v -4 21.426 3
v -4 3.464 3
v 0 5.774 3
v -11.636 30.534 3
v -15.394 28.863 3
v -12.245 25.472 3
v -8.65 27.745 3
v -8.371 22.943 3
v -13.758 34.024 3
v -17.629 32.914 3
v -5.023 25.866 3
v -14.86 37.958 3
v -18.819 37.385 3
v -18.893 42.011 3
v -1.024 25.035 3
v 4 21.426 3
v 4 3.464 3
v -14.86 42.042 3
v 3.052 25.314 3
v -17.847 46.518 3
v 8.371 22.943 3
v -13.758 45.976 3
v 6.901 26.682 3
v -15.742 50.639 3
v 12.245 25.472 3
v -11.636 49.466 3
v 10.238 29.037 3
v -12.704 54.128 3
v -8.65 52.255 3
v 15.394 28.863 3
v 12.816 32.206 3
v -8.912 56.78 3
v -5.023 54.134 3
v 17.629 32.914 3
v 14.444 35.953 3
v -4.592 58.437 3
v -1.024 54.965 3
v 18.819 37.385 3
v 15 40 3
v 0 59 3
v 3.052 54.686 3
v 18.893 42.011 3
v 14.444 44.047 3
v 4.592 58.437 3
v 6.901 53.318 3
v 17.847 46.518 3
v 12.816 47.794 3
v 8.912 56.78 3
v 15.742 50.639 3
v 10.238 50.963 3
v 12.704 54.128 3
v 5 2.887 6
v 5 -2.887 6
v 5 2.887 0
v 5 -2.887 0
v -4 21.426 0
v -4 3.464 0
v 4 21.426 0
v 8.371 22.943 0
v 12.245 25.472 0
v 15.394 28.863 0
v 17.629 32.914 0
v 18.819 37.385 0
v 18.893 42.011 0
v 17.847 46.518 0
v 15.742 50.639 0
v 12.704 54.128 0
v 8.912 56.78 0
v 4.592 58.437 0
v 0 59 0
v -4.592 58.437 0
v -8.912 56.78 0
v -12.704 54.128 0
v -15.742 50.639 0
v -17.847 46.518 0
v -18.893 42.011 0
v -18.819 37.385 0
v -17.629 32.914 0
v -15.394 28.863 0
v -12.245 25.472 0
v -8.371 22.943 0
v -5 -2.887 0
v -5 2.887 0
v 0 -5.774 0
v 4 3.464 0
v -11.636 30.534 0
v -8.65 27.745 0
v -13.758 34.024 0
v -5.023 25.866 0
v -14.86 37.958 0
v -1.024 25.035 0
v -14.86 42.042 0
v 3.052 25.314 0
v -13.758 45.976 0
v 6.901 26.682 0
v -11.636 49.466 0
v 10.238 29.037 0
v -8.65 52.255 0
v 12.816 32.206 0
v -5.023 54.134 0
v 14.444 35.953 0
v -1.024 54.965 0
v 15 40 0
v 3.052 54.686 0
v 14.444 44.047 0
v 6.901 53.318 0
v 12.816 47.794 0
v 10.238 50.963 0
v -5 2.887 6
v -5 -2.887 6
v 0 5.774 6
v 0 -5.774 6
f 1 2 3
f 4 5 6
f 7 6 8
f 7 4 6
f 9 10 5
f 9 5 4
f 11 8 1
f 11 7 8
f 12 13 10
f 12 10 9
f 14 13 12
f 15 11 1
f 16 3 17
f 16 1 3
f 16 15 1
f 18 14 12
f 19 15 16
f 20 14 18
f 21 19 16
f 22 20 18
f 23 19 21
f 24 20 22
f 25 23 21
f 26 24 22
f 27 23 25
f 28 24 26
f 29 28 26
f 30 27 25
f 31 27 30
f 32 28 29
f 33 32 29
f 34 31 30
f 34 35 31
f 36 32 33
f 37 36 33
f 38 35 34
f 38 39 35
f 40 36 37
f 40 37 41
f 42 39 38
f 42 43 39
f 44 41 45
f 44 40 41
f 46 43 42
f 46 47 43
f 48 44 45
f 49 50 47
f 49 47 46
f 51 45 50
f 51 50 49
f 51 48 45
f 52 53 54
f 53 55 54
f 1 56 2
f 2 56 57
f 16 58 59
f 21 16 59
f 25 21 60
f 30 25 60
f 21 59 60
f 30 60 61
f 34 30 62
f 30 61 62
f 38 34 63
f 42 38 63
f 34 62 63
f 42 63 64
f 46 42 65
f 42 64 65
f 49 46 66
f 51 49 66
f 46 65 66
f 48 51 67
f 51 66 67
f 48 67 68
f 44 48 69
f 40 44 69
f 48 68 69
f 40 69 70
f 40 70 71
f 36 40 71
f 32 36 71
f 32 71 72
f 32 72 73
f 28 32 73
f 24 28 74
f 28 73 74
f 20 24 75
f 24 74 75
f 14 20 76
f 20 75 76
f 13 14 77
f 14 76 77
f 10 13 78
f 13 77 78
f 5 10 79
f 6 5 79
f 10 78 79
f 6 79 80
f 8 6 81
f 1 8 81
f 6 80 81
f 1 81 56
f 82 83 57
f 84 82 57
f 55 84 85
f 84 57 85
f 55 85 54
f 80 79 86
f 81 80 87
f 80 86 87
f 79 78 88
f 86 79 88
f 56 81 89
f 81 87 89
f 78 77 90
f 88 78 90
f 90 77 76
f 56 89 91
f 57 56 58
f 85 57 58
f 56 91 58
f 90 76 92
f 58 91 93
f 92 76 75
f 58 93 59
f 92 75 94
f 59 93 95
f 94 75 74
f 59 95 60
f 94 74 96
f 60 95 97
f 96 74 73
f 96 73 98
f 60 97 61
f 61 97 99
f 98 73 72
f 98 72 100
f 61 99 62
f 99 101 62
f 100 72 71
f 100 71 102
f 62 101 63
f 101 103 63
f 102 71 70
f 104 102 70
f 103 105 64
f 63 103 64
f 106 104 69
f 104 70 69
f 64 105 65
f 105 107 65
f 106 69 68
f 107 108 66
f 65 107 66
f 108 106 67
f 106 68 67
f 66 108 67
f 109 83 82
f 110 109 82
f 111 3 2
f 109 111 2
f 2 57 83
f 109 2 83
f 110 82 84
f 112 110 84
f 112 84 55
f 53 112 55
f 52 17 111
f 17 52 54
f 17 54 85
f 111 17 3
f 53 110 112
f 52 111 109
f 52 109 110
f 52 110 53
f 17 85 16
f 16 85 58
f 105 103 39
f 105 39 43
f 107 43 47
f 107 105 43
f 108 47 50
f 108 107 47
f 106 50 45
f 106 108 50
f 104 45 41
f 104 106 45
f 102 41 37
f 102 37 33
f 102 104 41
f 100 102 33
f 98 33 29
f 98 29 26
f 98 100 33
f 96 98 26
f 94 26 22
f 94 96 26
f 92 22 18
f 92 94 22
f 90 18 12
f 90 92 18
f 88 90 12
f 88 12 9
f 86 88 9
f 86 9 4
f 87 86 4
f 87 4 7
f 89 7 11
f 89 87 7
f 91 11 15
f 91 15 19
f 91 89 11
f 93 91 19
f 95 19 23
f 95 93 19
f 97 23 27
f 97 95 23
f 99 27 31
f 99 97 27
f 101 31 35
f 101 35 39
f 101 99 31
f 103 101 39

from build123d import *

# Parameters (mm, degrees)
SKETCH1_R           = 19
SKETCH1_R_2         = 15
BOSS_EXTRUDE1_DEPTH = 3
BOSS_EXTRUDE2_DEPTH = 3


with BuildPart() as part:
    # Sketch1 → Boss-Extrude1 (new body)
    with BuildSketch(Plane.XY):
        Polygon((5, -2.886751346), (5, 2.886751346), (0, 5.773502692), (-5, 2.886751346), (-5, -2.886751346), (0, -5.773502692), align=None)
        with BuildLine():
            Line((-4, 3.464101615), (0, 5.773502692))
            Line((0, 5.773502692), (4, 3.464101615))
            Line((4, 3.464101615), (4, 21.425824379))
            ThreePointArc((4, 21.425824379), (0, 21), (-4, 21.425824379))
            Line((-4, 21.425824379), (-4, 3.464101615))
        make_face()
        with Locations((0, 40)):
            Circle(SKETCH1_R)
        with Locations((0, 40)):
            Circle(SKETCH1_R_2, mode=Mode.SUBTRACT)
    extrude(amount=BOSS_EXTRUDE1_DEPTH)

    # Sketch2 → Boss-Extrude2 (add)
    with BuildSketch(Plane.XY.offset(3)):
        Polygon((0, -5.773502692), (5, -2.886751346), (5, 2.886751346), (0, 5.773502692), (-5, 2.886751346), (-5, -2.886751346), align=None)
    extrude(amount=BOSS_EXTRUDE2_DEPTH)


solid = part.part
